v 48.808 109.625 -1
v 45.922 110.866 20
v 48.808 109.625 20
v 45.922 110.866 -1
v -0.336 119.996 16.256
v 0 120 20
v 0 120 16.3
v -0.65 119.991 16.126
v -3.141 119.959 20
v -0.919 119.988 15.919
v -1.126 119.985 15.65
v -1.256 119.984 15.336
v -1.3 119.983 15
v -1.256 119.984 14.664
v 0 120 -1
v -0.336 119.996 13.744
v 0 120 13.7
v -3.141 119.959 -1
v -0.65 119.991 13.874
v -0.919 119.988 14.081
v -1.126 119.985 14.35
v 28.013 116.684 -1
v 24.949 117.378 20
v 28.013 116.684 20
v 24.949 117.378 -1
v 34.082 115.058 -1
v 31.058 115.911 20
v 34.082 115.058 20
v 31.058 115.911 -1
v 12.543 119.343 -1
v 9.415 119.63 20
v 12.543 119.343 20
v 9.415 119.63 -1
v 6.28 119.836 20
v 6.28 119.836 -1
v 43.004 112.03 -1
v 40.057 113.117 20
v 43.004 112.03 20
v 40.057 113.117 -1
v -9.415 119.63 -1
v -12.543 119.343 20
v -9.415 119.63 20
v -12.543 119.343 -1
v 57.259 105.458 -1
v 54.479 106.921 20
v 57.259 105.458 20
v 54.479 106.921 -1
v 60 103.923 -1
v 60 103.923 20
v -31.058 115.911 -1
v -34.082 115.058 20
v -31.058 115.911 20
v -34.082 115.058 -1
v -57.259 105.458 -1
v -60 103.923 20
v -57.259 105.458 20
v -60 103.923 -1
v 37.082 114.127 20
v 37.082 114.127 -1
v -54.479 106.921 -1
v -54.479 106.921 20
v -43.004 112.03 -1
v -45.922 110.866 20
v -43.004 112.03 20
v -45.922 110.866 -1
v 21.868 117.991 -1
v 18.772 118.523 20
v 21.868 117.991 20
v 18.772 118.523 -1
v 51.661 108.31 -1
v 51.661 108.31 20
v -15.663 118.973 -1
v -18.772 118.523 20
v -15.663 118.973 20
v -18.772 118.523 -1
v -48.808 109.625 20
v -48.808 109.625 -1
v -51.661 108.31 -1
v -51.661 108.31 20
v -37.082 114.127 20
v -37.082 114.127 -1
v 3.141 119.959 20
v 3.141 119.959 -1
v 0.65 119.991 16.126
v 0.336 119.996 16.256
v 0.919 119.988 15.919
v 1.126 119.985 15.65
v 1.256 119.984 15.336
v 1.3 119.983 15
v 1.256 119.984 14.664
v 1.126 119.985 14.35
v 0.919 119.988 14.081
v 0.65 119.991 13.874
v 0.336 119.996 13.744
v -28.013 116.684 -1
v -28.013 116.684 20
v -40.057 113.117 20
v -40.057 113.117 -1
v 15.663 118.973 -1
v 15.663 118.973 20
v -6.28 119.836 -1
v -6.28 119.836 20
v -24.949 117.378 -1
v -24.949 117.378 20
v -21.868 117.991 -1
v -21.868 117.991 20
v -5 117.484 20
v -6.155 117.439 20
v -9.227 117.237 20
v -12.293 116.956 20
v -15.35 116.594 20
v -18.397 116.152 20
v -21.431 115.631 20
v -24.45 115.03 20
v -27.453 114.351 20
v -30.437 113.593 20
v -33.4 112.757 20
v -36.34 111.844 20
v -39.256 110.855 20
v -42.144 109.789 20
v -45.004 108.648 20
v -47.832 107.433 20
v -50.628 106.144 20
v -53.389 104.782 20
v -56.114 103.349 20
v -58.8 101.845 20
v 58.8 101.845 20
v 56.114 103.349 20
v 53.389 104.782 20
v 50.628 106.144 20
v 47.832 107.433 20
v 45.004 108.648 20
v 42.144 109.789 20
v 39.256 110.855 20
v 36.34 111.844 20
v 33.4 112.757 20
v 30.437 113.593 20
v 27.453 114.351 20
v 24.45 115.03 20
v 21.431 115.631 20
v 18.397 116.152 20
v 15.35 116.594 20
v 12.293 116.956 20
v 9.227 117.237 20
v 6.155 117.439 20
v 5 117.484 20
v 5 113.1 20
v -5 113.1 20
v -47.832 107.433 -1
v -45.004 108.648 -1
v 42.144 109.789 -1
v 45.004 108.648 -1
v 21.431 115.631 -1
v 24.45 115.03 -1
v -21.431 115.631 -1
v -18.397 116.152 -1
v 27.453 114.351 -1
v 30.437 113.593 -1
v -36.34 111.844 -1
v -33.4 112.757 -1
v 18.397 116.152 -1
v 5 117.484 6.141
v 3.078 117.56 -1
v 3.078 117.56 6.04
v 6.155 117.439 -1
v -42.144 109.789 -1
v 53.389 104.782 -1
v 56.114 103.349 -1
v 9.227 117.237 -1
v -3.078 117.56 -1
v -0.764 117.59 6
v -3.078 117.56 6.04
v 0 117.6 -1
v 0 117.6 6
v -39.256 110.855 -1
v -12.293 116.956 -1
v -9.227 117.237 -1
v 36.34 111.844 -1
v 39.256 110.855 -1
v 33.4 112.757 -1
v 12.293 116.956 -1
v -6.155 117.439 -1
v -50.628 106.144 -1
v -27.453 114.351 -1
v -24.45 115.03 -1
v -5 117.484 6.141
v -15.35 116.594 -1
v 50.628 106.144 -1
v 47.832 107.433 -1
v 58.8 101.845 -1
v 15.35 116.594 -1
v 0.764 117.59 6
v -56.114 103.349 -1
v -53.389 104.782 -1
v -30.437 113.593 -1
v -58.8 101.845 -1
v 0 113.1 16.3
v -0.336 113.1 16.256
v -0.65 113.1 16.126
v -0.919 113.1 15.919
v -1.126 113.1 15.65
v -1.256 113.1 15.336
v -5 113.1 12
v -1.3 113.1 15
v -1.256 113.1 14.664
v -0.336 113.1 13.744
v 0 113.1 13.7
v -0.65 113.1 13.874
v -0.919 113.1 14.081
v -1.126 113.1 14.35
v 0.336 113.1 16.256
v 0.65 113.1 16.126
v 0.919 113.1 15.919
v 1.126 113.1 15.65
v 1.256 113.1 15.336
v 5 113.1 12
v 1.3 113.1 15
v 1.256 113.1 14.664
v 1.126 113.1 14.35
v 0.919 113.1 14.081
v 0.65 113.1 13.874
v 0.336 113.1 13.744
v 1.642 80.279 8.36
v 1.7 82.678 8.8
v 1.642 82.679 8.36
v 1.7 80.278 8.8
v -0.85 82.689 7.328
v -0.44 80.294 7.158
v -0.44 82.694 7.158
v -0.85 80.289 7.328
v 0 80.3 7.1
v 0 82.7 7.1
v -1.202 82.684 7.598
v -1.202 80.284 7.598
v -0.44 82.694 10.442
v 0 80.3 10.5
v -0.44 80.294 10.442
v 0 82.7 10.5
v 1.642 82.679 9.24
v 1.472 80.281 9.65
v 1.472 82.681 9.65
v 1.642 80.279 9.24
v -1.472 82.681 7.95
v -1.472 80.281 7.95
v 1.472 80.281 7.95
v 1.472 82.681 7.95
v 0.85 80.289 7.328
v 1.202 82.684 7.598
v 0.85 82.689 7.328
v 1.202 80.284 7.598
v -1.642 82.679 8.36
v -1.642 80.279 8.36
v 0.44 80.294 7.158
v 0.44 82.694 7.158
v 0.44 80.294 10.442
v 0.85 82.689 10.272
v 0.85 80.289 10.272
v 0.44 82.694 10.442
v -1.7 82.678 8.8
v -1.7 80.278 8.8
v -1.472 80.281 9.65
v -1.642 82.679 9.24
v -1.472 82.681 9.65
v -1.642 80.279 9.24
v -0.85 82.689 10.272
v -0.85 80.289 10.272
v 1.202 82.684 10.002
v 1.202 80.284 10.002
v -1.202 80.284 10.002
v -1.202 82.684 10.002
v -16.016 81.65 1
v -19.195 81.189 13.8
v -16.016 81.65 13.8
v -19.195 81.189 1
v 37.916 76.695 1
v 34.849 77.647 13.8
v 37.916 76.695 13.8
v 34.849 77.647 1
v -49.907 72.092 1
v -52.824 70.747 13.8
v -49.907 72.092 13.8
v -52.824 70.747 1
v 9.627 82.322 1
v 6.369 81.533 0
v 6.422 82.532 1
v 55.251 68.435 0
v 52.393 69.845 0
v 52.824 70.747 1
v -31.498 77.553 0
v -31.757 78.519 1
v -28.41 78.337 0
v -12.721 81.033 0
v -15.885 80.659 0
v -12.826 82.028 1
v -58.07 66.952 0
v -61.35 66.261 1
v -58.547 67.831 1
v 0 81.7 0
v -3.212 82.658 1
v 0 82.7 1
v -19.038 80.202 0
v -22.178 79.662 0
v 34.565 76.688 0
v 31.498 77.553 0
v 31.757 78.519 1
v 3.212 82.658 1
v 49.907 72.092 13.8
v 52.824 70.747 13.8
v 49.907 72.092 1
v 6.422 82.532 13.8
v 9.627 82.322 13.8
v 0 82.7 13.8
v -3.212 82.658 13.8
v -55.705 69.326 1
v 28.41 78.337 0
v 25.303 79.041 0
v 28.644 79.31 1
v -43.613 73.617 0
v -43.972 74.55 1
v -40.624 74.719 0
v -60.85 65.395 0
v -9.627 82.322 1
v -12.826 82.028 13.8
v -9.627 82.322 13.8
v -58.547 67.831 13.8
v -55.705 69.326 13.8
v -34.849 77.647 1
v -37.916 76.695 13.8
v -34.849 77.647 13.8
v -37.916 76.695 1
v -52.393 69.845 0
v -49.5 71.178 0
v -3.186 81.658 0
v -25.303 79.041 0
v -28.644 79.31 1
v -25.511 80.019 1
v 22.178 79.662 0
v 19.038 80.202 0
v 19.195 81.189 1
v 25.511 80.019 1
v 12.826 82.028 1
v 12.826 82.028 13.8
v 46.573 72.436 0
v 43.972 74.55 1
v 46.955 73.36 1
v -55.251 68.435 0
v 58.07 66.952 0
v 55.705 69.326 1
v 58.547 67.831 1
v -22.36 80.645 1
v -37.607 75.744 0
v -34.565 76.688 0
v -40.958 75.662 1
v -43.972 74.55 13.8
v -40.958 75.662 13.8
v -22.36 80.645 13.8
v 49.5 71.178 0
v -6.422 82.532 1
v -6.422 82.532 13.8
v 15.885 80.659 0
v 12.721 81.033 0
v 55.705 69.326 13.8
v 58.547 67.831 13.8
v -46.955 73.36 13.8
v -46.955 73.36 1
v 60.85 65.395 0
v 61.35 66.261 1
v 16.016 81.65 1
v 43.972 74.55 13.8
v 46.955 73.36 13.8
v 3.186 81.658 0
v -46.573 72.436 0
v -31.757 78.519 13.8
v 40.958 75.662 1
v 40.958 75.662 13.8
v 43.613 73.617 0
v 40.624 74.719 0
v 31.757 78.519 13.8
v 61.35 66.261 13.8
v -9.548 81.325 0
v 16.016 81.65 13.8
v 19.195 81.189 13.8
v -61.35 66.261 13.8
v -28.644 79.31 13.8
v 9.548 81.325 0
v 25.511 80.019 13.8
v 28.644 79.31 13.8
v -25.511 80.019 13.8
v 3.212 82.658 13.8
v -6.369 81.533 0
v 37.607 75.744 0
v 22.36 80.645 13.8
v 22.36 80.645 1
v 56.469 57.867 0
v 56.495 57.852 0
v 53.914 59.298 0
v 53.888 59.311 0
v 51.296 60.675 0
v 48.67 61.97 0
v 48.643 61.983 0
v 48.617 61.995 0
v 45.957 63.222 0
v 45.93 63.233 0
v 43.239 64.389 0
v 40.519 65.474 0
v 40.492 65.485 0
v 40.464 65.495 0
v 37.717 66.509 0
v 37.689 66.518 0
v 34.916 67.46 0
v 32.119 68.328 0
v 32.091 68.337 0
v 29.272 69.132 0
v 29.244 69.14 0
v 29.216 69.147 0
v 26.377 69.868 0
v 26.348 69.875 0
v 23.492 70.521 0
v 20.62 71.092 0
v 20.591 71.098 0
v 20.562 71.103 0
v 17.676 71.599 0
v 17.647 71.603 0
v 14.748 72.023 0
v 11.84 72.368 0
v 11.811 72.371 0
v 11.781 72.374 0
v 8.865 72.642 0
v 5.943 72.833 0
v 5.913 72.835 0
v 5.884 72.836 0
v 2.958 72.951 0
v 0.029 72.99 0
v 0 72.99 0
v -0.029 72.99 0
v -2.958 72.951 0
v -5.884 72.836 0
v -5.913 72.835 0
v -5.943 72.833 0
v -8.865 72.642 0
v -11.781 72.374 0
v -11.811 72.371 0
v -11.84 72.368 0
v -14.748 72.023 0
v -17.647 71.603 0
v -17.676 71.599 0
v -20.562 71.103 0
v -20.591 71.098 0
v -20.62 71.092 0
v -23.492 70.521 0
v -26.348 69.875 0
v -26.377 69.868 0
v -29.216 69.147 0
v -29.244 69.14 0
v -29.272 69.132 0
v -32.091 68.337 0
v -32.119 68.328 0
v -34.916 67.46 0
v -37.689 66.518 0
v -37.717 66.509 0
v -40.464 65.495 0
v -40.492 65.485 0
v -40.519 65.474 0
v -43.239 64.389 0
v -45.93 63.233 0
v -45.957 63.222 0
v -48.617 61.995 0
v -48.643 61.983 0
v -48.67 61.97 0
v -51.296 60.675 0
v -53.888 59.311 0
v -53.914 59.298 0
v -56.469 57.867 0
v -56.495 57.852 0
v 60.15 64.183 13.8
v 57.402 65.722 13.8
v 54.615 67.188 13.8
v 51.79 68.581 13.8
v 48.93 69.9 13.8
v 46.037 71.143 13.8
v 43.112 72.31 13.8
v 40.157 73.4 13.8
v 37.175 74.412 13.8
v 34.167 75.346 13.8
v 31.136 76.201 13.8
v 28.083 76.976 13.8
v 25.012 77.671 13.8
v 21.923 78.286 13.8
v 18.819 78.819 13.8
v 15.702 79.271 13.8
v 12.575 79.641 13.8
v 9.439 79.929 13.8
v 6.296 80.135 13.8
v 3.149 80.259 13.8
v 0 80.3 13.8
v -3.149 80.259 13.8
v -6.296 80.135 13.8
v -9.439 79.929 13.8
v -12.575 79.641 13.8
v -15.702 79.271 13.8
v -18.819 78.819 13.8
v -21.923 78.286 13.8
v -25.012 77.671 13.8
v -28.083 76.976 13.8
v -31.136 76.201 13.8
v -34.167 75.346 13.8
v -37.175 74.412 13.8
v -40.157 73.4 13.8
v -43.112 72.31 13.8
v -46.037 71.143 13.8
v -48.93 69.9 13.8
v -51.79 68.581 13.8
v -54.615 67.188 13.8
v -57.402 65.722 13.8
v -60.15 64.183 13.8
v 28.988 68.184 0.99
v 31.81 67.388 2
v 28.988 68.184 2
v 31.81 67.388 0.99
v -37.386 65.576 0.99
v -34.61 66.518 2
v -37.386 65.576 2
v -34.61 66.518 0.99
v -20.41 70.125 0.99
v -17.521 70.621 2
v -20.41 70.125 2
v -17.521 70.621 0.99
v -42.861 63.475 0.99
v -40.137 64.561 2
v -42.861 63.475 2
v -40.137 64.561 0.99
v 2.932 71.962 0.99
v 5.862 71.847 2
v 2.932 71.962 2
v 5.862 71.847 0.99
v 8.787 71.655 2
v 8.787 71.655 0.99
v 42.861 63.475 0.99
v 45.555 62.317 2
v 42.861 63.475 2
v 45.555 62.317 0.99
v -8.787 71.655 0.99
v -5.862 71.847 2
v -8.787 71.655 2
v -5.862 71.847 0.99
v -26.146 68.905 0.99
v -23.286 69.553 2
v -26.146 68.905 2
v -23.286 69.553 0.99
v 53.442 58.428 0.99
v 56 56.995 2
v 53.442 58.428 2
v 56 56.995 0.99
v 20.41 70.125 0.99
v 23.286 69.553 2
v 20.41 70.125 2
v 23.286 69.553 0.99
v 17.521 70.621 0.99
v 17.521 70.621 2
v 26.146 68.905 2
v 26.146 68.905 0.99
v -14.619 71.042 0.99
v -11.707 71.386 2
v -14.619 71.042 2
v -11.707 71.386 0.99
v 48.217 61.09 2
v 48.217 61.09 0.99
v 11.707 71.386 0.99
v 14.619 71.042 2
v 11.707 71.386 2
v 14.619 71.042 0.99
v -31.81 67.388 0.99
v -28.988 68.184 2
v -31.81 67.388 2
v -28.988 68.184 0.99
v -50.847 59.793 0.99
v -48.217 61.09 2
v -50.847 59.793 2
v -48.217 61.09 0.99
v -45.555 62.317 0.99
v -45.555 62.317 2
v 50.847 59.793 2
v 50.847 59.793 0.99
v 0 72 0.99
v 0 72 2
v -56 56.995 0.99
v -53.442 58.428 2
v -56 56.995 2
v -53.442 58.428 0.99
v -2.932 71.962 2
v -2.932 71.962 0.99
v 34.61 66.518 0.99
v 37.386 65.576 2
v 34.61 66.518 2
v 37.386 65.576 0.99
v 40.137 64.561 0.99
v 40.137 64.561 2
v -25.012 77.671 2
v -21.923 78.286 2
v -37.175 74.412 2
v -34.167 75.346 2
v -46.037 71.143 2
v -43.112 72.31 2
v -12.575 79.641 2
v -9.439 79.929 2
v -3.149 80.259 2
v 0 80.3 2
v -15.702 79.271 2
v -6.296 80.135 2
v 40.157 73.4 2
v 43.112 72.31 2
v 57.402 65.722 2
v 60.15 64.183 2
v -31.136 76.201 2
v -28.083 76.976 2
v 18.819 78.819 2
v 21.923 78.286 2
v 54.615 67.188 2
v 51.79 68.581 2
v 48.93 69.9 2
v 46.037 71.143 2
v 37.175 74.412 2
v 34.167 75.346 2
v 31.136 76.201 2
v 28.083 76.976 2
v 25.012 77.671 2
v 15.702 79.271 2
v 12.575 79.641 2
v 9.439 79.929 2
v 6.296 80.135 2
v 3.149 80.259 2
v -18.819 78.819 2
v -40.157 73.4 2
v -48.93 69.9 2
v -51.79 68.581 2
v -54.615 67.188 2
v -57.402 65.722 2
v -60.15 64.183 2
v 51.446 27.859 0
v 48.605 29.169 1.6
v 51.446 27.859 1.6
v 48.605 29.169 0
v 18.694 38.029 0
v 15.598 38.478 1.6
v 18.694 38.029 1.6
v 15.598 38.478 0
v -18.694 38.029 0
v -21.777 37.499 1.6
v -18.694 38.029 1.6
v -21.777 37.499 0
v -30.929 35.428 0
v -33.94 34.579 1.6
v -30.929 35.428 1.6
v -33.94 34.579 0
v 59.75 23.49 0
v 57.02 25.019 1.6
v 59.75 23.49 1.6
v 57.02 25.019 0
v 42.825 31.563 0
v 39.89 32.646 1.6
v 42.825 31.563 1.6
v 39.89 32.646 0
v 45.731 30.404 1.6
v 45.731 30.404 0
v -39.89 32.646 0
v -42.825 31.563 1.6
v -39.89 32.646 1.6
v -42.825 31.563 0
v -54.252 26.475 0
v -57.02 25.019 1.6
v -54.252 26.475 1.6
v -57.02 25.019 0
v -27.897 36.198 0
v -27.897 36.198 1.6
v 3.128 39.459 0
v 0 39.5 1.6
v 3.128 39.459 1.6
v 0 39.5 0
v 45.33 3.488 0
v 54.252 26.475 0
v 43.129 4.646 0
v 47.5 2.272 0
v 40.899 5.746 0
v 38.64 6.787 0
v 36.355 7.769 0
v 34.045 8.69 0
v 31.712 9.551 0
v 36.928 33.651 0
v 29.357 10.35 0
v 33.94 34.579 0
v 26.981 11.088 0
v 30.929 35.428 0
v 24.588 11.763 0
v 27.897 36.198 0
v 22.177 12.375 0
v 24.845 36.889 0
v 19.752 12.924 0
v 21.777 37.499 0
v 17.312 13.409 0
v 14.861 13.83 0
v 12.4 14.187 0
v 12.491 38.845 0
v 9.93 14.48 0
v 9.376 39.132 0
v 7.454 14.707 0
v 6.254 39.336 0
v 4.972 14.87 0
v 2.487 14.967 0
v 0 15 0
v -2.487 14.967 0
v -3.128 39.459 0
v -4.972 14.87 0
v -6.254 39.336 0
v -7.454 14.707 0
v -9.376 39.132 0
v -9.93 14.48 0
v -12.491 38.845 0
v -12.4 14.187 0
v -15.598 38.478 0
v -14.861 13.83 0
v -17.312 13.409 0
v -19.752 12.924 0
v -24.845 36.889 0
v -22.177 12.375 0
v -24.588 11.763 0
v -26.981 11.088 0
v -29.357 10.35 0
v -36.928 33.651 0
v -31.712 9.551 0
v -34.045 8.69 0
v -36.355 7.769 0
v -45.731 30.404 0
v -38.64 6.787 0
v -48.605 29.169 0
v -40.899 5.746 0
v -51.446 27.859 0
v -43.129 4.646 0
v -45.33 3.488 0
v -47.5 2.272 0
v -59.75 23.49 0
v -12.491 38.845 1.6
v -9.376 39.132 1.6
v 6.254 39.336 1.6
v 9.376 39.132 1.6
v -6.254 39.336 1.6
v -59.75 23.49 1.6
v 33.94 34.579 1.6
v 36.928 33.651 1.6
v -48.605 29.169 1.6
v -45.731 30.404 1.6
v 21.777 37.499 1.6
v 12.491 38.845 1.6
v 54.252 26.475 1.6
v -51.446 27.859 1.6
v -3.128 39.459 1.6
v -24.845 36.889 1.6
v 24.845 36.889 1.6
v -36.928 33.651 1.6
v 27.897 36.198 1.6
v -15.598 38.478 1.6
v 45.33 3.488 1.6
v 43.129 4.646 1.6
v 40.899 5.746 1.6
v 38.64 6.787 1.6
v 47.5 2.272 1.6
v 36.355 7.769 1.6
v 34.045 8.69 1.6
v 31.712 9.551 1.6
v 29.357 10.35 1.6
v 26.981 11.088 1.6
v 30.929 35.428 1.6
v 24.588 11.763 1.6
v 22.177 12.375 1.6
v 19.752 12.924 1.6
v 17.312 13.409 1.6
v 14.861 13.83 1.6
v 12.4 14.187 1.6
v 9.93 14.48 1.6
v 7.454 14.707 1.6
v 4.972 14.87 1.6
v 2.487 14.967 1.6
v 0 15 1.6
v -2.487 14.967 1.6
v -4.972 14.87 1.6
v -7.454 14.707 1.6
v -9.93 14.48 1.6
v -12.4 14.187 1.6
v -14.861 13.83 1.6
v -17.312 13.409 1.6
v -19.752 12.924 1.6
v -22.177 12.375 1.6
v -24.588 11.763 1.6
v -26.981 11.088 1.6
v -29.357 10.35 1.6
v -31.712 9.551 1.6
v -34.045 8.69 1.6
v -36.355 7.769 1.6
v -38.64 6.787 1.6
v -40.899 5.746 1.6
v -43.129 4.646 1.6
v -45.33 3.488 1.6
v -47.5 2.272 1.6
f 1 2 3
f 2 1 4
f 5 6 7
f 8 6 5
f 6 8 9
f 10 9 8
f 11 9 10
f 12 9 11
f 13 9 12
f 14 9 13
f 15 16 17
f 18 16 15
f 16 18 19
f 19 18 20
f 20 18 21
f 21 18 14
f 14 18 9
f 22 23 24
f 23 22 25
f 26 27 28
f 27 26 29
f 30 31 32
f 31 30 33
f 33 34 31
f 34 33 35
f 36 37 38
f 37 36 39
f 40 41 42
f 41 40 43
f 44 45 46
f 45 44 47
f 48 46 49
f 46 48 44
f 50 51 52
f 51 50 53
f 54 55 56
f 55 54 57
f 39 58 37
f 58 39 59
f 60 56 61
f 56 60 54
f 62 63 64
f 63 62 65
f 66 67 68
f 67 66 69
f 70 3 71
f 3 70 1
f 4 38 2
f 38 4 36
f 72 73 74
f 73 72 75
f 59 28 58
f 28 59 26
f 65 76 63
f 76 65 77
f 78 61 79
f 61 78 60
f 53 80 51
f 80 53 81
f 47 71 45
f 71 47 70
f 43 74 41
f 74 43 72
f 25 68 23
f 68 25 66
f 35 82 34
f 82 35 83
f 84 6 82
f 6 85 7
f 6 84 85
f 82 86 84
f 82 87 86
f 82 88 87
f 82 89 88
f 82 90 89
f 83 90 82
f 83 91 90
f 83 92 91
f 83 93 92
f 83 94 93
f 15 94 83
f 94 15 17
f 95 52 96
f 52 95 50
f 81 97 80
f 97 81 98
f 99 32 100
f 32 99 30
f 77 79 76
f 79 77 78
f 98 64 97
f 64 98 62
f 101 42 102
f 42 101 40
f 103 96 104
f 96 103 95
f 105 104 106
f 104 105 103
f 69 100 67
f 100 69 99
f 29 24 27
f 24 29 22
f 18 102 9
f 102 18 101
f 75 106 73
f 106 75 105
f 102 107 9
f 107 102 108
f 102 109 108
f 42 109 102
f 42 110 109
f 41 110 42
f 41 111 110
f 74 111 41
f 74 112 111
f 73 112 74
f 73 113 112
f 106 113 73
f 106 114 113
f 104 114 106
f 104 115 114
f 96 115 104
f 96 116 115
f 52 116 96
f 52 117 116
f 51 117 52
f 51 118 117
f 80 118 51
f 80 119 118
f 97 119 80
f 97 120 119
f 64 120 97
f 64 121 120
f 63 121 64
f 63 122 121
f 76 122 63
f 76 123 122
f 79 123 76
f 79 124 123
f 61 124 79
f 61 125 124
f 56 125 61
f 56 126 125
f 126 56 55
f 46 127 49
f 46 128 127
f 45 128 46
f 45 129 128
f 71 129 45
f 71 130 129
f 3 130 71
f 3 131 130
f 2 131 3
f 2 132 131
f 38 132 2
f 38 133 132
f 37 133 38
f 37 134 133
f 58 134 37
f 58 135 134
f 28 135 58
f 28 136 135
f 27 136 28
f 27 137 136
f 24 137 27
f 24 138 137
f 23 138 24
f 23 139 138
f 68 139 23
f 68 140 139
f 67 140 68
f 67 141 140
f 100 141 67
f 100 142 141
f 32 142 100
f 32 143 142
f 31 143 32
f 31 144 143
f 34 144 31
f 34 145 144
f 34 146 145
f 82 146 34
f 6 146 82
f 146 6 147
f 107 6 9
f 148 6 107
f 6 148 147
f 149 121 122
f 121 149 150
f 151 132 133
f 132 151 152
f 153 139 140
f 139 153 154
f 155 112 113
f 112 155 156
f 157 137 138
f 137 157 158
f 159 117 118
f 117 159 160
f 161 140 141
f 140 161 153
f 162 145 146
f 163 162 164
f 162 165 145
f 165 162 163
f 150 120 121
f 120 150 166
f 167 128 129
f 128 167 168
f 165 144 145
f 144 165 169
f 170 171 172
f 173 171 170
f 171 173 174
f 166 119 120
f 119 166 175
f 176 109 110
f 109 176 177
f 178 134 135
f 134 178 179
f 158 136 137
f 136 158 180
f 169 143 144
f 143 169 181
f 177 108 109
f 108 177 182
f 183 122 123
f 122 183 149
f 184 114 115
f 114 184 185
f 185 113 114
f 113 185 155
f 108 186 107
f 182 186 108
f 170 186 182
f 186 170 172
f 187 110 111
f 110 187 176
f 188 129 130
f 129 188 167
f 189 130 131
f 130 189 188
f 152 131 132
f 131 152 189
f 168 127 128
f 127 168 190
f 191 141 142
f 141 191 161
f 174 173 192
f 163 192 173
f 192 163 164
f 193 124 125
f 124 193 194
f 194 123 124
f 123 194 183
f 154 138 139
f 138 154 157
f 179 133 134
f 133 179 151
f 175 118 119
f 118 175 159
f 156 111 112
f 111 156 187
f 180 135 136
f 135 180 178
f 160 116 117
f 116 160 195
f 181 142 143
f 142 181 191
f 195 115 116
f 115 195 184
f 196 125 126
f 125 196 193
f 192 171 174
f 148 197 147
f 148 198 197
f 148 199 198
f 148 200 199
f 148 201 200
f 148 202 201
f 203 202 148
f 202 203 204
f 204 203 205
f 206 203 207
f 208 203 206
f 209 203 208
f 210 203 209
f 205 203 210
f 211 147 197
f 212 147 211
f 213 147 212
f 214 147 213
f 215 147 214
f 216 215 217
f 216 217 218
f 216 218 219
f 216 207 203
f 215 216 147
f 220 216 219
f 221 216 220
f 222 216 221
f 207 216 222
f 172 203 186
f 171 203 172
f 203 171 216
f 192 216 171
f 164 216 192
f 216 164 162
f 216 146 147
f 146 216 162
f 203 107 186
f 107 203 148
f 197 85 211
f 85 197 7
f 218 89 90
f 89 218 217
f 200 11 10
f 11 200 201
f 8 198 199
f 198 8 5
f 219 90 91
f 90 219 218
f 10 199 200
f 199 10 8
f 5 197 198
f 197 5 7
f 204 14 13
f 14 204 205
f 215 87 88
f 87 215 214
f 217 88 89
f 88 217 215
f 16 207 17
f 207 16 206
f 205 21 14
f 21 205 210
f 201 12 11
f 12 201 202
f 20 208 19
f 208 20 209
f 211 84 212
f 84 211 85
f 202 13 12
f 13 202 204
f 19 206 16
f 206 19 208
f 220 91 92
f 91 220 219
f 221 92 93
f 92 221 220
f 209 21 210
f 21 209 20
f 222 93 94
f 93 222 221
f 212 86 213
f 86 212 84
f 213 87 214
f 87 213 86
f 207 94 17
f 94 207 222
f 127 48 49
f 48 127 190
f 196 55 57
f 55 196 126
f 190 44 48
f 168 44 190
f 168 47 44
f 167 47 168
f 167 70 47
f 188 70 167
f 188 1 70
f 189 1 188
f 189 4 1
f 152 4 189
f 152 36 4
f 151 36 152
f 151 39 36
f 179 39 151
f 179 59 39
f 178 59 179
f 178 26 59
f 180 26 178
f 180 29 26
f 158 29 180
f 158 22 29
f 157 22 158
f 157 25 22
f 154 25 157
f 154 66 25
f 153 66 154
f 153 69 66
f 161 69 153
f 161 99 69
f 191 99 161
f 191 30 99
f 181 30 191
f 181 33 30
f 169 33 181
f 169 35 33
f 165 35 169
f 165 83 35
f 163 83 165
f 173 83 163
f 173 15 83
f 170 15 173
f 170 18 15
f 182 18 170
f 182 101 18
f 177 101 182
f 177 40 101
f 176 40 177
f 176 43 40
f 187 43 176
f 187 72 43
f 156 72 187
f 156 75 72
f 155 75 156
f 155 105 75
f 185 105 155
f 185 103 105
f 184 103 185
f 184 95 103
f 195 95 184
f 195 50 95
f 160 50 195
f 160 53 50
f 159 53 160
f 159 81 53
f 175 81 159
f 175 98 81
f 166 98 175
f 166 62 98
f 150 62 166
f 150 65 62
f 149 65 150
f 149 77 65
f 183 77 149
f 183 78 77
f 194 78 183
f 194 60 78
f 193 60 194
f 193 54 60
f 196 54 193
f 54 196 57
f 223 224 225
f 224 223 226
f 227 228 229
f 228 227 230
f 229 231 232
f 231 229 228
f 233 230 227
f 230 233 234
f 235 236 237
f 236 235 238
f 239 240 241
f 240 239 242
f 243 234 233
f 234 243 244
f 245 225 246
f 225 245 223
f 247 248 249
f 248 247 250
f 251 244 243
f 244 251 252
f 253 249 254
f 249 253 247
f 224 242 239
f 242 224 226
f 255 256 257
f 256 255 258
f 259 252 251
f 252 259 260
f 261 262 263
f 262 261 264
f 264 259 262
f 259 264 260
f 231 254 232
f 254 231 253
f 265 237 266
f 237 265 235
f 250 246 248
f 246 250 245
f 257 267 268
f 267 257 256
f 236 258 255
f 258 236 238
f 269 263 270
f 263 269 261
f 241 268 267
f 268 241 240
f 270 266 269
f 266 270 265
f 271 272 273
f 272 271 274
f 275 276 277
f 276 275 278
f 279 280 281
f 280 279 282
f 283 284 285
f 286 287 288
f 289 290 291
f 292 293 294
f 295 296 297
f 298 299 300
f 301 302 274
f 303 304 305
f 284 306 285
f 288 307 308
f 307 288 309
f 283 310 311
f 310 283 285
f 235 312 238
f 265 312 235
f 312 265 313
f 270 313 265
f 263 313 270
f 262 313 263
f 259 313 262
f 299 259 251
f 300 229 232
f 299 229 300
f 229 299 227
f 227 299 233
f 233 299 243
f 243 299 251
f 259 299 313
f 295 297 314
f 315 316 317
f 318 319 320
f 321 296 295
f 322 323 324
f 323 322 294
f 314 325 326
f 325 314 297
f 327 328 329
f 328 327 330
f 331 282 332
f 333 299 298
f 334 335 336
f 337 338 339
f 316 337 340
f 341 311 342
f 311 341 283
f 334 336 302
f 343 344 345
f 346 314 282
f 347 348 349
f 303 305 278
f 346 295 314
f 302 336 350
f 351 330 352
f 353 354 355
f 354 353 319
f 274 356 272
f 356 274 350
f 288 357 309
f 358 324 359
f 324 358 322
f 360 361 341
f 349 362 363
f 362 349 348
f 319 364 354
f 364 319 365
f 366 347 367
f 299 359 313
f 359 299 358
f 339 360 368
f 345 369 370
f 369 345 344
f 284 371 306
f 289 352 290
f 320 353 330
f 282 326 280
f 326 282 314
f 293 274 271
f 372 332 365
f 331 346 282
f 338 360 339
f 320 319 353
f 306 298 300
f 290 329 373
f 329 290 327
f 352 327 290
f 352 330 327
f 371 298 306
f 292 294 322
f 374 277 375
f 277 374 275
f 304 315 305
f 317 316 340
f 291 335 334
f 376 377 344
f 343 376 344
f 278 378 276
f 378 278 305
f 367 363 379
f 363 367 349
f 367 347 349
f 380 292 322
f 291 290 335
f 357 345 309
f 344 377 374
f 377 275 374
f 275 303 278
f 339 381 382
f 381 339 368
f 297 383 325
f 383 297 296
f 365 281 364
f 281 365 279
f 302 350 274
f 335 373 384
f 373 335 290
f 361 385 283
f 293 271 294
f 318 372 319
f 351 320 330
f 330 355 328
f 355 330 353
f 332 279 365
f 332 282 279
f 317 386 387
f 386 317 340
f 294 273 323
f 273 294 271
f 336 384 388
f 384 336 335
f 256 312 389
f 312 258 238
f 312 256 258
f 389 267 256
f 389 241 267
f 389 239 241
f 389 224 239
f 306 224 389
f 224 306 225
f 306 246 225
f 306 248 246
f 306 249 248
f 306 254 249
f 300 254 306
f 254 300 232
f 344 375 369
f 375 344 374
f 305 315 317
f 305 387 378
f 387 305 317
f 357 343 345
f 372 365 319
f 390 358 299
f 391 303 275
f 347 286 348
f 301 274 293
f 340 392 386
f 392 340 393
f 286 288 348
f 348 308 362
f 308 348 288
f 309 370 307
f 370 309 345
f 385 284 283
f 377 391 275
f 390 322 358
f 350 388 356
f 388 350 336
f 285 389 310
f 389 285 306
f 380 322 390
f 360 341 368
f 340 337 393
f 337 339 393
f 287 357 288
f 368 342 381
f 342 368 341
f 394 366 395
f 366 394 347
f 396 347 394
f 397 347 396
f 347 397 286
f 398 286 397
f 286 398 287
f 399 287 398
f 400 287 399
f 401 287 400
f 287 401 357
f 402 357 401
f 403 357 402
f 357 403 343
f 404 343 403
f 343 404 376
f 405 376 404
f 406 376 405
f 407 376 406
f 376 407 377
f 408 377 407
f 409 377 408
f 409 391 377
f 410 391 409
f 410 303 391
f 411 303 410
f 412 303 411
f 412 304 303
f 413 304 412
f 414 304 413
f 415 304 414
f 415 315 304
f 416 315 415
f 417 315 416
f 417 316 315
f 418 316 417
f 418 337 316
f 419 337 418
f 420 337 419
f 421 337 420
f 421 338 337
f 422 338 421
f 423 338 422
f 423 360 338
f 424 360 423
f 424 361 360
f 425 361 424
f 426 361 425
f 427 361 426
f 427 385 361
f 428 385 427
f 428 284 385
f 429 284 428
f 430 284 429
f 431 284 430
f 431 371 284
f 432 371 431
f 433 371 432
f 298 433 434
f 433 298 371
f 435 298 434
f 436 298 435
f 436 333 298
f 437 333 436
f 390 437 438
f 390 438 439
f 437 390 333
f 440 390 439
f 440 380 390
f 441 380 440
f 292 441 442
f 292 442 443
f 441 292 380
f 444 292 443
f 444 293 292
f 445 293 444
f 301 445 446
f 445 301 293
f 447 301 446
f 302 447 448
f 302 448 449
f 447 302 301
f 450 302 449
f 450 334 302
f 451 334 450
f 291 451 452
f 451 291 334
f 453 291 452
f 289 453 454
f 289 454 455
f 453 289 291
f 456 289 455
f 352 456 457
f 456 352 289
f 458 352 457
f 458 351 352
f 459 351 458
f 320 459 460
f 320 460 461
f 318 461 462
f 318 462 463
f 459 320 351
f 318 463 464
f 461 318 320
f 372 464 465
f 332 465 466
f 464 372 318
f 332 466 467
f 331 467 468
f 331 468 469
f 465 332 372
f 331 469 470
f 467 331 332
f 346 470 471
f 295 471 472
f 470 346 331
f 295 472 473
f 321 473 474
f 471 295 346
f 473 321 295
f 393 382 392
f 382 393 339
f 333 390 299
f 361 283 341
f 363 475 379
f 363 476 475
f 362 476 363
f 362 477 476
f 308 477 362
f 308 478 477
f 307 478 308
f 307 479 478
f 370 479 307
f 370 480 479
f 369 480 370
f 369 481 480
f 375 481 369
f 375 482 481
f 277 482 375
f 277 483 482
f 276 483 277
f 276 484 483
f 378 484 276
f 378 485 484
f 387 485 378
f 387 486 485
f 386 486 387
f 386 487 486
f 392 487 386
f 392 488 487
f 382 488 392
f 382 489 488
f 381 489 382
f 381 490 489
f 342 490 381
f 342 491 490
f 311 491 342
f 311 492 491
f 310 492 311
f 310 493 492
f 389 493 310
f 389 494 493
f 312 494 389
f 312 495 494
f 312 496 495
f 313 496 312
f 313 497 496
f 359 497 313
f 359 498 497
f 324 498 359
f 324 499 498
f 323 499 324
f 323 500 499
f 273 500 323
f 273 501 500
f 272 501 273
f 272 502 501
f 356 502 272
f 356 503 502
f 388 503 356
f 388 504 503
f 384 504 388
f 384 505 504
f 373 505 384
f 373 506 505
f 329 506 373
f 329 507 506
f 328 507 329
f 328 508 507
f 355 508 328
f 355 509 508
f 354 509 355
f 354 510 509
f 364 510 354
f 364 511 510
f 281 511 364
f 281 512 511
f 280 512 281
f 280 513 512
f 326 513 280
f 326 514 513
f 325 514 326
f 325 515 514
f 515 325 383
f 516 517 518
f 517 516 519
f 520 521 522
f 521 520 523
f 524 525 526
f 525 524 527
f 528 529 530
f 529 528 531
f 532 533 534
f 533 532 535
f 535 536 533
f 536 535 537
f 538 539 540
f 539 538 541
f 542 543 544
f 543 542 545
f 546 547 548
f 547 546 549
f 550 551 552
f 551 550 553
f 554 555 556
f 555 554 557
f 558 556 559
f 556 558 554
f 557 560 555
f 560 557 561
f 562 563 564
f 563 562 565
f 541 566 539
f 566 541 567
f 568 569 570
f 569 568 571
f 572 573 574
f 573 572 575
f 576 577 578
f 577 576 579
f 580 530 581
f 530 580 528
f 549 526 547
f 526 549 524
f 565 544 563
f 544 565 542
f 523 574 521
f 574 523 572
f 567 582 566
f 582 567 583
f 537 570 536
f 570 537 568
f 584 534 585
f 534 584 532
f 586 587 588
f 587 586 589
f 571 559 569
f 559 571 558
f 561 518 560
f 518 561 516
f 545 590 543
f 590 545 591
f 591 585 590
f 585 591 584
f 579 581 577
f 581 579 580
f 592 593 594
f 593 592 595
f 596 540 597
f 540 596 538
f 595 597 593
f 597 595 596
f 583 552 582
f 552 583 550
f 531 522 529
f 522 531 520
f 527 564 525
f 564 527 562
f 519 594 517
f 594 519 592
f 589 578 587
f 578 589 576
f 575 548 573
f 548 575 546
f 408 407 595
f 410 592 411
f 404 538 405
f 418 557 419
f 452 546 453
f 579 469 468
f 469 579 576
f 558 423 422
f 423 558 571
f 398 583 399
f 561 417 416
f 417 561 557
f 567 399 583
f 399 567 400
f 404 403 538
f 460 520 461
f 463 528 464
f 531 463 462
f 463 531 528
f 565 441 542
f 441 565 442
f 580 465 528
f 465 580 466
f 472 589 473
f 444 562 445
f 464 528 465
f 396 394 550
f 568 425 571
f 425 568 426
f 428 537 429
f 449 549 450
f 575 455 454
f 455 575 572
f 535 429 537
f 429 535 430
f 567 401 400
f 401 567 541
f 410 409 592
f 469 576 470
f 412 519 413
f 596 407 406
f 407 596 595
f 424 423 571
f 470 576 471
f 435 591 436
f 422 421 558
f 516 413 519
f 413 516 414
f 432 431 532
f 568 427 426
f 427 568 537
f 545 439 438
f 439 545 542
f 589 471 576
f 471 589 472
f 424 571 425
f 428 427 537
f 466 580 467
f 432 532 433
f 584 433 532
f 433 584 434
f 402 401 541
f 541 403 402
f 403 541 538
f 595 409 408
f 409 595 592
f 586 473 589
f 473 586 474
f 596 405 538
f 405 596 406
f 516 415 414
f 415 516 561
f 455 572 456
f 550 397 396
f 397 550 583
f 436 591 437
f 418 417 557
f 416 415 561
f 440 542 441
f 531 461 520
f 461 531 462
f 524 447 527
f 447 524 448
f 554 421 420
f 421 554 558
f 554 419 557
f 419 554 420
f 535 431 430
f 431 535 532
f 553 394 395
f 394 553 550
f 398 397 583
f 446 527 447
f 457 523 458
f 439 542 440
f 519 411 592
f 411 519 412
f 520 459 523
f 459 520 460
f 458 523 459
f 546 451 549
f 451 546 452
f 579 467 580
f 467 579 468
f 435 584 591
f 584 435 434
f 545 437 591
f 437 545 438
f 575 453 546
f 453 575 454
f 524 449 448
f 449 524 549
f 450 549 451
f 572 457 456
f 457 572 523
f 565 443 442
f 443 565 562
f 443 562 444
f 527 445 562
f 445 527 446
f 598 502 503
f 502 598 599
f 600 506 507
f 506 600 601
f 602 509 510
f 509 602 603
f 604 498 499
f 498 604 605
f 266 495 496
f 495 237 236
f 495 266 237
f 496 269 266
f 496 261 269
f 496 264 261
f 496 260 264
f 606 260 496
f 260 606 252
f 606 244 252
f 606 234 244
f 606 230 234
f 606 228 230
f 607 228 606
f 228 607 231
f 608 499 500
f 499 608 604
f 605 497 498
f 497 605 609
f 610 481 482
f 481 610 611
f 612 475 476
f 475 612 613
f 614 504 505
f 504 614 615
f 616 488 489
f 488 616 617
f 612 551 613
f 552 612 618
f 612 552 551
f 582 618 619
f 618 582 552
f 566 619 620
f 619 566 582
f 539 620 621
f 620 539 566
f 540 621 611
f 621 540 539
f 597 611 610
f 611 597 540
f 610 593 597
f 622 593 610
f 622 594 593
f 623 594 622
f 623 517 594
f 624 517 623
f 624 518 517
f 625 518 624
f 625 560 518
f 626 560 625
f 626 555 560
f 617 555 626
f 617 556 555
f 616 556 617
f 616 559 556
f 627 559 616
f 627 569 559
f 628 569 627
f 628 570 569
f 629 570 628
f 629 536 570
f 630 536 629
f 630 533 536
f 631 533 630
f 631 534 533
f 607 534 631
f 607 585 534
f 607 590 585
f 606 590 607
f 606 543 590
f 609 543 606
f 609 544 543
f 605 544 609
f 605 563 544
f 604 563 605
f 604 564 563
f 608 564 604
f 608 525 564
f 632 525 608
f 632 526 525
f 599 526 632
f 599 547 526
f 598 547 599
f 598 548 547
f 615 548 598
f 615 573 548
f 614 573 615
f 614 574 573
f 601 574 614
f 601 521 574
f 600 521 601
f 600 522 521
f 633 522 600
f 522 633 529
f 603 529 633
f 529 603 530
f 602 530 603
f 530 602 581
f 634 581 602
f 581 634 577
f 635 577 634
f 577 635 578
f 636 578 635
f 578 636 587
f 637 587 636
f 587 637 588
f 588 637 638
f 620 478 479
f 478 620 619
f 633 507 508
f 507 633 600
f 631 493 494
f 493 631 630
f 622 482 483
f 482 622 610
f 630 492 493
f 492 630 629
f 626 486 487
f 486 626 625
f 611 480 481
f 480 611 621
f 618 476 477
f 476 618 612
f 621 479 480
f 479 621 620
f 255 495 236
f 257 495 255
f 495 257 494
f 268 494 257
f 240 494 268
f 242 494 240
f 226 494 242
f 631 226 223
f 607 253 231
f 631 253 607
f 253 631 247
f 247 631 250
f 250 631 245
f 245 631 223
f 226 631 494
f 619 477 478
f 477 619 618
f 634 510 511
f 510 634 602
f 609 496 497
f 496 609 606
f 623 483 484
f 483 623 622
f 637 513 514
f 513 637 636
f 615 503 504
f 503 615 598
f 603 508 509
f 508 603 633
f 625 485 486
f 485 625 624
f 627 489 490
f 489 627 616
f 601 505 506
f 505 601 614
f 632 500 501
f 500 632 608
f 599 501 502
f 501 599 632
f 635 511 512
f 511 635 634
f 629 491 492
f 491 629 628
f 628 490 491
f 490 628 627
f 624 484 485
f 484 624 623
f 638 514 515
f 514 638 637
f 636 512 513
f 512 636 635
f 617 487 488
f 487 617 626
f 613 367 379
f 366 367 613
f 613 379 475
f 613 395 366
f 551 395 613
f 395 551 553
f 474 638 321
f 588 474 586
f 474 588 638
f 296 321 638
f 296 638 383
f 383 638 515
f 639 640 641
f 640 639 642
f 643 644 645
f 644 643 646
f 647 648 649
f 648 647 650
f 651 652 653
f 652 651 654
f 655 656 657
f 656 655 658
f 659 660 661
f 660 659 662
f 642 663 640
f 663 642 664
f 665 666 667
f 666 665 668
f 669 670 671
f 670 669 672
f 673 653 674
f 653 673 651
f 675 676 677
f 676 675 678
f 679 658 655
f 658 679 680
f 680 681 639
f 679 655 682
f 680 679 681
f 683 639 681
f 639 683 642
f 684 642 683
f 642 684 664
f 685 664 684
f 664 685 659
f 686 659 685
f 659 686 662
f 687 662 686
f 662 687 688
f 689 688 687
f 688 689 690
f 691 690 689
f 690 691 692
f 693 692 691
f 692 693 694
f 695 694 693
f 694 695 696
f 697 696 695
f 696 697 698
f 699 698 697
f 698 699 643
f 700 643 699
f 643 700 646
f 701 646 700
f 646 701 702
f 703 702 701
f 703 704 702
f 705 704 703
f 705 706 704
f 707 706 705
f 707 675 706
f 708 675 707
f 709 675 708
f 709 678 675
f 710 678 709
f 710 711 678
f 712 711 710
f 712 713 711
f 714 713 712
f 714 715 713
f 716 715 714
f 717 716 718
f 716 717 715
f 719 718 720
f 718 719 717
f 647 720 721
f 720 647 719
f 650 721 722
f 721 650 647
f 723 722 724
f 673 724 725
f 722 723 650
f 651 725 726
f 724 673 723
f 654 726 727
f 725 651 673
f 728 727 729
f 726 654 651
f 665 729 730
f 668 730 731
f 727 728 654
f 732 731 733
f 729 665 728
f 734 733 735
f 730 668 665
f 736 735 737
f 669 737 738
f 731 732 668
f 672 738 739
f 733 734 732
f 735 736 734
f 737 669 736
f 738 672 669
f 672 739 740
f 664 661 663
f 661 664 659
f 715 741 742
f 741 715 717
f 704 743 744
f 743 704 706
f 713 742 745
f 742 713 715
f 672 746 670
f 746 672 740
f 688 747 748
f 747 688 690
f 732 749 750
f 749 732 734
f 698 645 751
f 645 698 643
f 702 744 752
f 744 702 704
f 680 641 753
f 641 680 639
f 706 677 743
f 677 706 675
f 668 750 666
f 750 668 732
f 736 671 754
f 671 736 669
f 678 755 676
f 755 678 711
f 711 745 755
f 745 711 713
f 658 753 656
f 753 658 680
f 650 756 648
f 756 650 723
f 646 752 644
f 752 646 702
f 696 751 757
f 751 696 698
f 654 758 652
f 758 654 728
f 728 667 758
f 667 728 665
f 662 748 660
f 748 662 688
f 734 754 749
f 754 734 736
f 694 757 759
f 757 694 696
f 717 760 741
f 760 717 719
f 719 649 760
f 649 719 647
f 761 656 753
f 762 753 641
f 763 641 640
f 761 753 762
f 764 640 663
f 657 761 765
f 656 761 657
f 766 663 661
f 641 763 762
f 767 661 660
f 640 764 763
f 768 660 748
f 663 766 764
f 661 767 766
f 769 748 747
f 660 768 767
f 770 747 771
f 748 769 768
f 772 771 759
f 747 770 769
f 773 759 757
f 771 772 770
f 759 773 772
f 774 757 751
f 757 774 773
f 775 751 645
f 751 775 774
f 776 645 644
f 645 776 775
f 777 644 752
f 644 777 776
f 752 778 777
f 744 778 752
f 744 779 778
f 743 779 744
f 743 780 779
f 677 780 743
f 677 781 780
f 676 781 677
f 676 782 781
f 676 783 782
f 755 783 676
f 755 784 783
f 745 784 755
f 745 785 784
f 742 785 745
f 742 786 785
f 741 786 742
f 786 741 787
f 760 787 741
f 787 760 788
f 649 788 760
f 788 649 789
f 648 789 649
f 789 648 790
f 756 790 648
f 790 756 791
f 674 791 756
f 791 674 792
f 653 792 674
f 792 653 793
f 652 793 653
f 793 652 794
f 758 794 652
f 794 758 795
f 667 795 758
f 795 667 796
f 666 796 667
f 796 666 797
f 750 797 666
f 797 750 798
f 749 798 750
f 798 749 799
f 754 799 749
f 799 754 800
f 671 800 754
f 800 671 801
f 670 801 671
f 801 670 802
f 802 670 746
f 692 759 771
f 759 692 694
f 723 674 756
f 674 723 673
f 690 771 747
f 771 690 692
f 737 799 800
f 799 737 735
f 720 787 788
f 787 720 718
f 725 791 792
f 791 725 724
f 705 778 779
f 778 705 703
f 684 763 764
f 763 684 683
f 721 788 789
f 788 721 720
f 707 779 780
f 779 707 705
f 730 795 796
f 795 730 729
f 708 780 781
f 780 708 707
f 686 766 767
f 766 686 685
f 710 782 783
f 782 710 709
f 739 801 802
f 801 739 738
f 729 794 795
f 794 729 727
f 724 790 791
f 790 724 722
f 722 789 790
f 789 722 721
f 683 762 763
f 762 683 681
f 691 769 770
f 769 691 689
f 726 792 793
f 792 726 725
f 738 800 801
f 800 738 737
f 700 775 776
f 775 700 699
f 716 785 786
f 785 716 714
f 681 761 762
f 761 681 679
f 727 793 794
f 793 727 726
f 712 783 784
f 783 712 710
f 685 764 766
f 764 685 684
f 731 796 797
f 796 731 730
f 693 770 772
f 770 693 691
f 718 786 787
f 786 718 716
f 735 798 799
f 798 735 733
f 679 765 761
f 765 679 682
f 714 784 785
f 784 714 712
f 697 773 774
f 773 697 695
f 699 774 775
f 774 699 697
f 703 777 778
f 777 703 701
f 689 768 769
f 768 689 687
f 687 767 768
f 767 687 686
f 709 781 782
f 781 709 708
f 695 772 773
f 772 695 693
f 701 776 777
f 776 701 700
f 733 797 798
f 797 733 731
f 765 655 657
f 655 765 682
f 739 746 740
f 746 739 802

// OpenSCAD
// FIT TEST - 60-degree slices of the full-size (240 mm) body rim, bezel and face.
// Tests the bezel slide fit, the face seat and one bezel screw, using ~25 g of filament.
include <lightbox.scad>
part = "all";   // body_arc | bezel_arc | face_arc

module wedge(h) rotate([0, 0, 60]) rotate_extrude(angle = 60) translate([0, -1]) square([BR + 5, h + 2]);

H = body_h(false);
module body_arc()  intersection() { translate([0, 0, -(H - 20)]) body(); wedge(20); }   // top 20 mm, with the screw boss at 90 deg
module bezel_arc() intersection() { bezel(); wedge(30); }
module face_arc()  intersection() { difference() { blank_face(); translate([0, 0, -1]) cylinder(r = R - 25, h = 5); } wedge(5); }

if (part == "body_arc") body_arc();
else if (part == "bezel_arc") bezel_arc();
else if (part == "face_arc") face_arc();
else { body_arc(); translate([0, -40, 0]) bezel_arc(); translate([0, -80, 0]) face_arc(); }
